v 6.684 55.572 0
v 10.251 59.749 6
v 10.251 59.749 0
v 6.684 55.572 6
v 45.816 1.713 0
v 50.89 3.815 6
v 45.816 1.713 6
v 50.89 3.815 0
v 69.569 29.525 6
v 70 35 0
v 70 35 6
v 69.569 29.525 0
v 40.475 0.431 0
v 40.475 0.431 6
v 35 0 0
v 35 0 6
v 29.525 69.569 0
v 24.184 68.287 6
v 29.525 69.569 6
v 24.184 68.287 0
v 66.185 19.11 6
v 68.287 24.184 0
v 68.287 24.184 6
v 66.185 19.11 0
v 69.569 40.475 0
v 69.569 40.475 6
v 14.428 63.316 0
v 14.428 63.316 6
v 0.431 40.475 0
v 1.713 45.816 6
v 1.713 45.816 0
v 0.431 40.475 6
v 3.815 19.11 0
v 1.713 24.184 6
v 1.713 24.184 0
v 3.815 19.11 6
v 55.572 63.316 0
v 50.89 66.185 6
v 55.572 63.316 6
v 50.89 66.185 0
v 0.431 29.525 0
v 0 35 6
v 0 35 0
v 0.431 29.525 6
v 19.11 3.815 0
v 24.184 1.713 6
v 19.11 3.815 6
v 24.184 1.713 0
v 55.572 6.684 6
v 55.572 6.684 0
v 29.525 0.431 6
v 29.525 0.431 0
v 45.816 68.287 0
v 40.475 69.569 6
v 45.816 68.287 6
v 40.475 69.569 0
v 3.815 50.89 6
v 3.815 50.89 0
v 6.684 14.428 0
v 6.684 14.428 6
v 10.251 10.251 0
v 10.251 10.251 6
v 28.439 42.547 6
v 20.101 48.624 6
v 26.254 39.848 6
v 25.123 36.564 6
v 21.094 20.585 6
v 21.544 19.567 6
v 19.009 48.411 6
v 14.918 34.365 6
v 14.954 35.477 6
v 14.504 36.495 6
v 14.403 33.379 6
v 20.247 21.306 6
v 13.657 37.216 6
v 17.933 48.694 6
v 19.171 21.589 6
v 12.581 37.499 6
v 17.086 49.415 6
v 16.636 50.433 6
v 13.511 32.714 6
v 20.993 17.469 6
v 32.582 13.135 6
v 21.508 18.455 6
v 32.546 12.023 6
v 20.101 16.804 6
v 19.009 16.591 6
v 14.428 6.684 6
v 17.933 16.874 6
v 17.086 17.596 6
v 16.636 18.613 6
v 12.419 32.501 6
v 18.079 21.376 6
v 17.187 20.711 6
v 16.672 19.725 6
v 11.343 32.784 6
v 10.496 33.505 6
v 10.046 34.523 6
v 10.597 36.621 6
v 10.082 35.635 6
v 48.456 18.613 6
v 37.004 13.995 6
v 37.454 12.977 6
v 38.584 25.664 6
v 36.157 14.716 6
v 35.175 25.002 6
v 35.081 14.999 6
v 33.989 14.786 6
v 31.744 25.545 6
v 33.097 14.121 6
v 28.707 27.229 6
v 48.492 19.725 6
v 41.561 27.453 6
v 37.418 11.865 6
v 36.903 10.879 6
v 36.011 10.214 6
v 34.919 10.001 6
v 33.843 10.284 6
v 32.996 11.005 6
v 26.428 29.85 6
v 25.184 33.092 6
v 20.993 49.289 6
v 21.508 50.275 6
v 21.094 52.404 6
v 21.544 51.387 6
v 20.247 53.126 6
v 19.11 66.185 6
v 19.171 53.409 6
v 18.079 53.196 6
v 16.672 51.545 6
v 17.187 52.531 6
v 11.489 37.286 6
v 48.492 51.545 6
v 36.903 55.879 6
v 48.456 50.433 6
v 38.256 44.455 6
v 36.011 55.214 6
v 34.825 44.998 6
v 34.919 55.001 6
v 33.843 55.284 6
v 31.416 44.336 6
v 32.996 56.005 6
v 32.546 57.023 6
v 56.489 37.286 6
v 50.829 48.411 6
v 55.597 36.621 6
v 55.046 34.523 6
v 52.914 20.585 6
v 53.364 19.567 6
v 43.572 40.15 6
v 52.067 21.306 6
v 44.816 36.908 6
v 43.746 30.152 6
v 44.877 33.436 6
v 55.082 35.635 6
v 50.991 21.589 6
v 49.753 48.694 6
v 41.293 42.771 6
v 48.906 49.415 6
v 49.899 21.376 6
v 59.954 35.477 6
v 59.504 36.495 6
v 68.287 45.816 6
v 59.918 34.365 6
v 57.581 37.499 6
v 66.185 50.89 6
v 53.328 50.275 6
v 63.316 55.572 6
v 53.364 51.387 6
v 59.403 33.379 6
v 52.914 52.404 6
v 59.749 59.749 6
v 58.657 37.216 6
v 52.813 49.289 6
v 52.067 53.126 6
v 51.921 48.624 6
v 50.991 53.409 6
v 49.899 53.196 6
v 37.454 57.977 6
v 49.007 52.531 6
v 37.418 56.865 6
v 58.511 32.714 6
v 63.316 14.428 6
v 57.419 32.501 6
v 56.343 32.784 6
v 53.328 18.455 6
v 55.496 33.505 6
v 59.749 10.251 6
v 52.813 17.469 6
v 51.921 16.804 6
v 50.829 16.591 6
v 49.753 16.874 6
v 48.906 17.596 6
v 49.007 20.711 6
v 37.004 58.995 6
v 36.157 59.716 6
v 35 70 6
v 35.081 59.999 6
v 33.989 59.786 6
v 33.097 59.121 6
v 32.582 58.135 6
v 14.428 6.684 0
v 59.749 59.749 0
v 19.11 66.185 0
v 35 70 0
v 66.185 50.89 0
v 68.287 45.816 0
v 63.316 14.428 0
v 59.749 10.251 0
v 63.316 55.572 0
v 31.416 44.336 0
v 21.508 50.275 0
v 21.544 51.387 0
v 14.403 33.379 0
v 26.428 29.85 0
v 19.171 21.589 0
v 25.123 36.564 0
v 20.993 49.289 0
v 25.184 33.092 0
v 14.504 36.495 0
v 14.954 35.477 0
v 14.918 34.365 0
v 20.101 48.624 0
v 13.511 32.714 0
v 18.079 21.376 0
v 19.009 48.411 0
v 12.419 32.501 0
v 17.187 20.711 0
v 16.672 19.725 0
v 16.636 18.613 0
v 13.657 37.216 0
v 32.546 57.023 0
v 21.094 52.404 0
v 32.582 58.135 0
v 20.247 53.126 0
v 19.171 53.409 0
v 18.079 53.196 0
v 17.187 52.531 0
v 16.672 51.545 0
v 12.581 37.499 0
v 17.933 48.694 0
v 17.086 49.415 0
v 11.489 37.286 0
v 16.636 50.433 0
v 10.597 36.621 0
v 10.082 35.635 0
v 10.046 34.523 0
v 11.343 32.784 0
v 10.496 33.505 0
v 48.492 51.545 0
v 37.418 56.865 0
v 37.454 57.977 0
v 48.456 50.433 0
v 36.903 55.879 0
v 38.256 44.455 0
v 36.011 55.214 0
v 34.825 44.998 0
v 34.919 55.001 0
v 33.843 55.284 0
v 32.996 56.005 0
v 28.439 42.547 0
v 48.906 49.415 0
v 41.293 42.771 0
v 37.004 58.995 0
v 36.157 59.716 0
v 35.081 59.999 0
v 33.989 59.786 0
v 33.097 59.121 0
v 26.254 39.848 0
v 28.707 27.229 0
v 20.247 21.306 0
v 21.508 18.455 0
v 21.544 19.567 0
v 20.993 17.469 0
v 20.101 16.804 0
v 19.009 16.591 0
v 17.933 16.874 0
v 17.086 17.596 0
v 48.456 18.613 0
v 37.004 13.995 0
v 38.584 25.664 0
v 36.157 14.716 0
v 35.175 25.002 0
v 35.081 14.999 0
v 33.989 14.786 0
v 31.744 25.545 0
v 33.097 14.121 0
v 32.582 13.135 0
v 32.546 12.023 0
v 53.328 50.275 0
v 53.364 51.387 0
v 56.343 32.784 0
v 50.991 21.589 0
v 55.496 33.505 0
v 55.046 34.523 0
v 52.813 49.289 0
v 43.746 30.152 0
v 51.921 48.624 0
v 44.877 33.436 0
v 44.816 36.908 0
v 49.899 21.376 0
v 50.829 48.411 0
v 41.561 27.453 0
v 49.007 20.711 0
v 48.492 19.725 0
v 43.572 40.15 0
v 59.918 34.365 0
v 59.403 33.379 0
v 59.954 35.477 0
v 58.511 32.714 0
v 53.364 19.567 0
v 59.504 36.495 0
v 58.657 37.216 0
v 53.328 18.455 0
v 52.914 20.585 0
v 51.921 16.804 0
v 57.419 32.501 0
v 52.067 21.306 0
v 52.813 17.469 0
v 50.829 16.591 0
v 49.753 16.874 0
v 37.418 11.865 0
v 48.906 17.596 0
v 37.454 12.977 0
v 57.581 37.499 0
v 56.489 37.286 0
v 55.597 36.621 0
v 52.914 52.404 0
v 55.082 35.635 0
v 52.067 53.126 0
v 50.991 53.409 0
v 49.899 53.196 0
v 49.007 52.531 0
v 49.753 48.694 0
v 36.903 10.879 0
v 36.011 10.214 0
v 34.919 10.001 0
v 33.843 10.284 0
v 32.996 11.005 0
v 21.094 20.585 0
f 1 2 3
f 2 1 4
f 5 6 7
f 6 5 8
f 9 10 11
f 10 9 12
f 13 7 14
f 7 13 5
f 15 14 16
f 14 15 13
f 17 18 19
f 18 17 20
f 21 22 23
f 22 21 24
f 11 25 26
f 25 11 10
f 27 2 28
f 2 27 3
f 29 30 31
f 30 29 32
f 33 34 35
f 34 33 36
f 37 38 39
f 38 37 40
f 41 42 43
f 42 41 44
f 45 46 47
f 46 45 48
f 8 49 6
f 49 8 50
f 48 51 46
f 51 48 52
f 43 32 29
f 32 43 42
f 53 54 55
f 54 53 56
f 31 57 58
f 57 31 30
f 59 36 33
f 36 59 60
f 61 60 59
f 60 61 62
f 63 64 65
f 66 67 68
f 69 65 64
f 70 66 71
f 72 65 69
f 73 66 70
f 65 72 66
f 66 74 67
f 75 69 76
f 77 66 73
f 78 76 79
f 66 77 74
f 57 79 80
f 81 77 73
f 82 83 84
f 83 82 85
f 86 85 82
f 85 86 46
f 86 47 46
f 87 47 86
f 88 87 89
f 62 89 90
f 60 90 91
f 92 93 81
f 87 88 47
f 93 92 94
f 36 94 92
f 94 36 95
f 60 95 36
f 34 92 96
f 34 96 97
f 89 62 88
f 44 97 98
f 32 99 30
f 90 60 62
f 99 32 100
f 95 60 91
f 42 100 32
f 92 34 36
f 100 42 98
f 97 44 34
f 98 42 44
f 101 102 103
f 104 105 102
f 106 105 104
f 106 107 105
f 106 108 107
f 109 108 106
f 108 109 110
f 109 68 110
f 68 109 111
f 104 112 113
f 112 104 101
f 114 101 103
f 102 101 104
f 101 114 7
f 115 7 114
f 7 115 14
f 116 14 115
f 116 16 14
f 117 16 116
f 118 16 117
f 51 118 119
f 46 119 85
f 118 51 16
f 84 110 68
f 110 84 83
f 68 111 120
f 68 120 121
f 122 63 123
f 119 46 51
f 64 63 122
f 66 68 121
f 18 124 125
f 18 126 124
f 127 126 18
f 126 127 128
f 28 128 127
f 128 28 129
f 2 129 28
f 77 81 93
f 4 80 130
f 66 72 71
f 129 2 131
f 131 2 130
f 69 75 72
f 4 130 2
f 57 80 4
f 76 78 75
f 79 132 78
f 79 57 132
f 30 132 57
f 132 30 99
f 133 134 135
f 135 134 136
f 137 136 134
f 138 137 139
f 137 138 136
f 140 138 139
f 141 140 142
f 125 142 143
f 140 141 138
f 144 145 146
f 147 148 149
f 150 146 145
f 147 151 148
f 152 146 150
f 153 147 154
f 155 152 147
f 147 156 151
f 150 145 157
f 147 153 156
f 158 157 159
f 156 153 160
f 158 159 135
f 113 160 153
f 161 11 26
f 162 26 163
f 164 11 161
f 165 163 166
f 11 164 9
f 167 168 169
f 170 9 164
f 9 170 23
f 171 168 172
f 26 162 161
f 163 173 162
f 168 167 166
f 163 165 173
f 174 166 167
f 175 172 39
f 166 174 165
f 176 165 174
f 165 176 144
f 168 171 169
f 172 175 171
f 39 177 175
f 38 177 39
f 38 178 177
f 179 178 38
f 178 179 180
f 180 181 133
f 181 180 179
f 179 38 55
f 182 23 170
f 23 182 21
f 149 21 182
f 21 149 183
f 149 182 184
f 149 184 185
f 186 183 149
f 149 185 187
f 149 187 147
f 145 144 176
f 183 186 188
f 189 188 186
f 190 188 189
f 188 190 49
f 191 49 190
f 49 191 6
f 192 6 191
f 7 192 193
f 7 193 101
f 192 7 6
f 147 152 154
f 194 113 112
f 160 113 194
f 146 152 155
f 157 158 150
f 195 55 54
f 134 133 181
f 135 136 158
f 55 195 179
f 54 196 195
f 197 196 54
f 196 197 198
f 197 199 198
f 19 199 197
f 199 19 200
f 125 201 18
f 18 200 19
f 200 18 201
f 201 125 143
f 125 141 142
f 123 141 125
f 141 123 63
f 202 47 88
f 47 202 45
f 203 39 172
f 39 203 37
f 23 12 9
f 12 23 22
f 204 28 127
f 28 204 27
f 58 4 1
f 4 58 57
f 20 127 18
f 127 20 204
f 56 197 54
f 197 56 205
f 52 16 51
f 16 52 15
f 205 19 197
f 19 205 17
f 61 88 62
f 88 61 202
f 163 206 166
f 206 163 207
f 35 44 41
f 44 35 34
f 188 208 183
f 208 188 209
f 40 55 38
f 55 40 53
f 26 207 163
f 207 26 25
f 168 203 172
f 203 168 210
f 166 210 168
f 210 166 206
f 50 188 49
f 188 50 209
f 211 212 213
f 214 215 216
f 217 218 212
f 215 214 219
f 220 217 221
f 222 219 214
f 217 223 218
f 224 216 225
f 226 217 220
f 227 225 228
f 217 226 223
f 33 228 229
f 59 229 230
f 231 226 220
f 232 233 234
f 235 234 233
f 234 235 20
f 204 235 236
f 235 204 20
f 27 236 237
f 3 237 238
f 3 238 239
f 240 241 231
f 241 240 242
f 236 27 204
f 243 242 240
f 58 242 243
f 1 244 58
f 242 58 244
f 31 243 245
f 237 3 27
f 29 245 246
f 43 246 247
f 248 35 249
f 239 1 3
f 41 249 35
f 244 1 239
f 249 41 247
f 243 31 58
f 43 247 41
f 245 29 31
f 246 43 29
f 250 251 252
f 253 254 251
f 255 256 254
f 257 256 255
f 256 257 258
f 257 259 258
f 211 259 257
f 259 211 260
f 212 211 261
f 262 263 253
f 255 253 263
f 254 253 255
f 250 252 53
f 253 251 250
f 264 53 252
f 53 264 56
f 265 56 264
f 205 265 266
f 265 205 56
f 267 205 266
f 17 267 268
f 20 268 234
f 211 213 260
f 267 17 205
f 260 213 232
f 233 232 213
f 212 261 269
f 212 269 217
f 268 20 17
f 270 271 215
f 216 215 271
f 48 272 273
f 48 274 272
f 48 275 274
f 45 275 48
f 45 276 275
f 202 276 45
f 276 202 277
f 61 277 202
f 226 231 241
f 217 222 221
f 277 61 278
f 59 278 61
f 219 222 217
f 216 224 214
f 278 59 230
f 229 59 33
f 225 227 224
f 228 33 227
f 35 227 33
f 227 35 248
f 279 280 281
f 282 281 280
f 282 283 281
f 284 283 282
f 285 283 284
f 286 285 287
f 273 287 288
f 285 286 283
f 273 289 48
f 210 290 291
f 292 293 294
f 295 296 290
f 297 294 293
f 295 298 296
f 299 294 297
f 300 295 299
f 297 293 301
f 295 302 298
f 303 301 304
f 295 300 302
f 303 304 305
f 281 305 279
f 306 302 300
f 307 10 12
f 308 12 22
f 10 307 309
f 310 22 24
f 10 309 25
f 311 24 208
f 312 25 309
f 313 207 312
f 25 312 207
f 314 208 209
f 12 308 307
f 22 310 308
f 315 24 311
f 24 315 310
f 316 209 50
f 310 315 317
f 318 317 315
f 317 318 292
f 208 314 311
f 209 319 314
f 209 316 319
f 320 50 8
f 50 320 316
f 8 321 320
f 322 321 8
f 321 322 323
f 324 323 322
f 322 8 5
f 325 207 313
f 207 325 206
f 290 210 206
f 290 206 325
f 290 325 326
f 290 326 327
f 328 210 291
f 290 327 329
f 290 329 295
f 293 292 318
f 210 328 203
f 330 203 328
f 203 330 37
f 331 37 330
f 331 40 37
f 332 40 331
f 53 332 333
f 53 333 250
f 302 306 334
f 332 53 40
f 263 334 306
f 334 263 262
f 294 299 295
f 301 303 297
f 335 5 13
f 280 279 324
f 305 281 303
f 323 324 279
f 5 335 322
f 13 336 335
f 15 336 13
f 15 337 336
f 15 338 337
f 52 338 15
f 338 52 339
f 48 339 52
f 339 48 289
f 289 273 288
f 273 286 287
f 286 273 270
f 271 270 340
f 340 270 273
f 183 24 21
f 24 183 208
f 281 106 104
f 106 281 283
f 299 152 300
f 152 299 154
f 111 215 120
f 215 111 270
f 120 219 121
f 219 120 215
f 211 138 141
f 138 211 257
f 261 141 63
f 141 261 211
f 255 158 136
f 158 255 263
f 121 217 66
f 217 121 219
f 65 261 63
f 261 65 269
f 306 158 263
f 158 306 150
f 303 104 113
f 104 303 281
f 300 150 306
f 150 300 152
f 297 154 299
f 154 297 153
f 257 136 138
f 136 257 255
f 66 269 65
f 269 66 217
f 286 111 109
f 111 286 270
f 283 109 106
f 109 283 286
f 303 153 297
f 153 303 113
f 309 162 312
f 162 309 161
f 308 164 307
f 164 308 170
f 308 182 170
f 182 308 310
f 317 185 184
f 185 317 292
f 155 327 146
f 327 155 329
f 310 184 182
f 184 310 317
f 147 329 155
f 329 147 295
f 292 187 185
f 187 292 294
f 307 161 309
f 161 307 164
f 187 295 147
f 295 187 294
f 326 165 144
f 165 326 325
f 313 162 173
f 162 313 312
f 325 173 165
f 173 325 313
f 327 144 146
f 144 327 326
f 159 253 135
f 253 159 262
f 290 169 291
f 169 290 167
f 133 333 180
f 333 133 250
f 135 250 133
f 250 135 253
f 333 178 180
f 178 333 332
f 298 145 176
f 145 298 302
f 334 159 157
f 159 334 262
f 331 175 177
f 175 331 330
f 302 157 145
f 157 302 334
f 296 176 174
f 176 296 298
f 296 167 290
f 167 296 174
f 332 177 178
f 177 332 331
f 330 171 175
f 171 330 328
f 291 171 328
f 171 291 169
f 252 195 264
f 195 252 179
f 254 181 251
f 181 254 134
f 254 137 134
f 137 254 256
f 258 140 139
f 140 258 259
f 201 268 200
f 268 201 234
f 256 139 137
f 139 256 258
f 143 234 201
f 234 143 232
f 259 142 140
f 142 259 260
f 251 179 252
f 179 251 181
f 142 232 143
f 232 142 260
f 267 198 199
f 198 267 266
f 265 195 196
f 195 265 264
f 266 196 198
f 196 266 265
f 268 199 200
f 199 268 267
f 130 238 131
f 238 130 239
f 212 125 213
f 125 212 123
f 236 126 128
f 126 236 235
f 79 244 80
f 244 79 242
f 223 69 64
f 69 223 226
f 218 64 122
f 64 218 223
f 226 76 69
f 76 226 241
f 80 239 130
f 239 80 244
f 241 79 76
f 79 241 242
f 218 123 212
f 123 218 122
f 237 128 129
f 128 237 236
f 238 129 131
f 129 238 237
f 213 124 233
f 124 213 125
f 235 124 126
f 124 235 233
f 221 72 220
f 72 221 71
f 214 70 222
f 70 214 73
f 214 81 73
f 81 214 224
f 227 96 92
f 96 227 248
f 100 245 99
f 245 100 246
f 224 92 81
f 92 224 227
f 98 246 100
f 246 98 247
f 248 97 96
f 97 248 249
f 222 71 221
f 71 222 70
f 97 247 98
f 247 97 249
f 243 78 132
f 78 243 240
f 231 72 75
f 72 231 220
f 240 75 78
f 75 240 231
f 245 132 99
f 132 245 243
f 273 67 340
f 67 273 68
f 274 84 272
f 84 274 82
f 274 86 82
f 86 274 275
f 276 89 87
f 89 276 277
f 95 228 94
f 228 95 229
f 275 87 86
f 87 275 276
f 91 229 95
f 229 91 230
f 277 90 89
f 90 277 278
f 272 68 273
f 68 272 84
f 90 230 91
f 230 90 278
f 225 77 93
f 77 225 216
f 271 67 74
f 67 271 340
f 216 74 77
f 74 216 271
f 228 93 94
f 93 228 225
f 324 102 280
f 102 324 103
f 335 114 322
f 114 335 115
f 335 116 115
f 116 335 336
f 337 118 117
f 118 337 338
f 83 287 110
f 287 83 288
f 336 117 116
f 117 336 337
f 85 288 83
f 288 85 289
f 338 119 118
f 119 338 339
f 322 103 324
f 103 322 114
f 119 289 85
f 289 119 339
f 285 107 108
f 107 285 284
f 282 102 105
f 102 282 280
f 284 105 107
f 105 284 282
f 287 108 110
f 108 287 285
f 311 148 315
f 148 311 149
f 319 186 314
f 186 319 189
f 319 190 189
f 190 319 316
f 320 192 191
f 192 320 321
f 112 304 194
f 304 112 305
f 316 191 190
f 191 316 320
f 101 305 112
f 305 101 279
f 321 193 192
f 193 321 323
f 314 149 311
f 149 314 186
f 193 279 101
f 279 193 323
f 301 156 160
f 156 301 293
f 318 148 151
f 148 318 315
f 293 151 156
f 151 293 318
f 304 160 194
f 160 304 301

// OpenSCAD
$fn = 32;

// ----------------------------------------------------------------------
// Spacer plate: round flange R35, 8 bolts
// ----------------------------------------------------------------------

// --- parameters (mm) ---
bore_r = 10;              // centre bore radius
bolt_r = 2.5;             // bolt hole radius
plate_t = 6;              // plate thickness, Z (extrusion height)
flange_r = 35;            // flange radius
n_bolt = 8;               // bolt hole count
ring_r = 22.5;            // bolt circle radius

profile = [[70, 35], [69.569, 40.475], [68.287, 45.816], [66.185, 50.89], [63.316, 55.572], [59.749, 59.749], [55.572, 63.316], [50.89, 66.185], [45.816, 68.287], [40.475, 69.569], [35, 70], [29.525, 69.569], [24.184, 68.287], [19.11, 66.185], [14.428, 63.316], [10.251, 59.749], [6.684, 55.572], [3.815, 50.89], [1.713, 45.816], [0.431, 40.475], [0, 35], [0.431, 29.525], [1.713, 24.184], [3.815, 19.11], [6.684, 14.428], [10.251, 10.251], [14.428, 6.684], [19.11, 3.815], [24.184, 1.713], [29.525, 0.431], [35, 0], [40.475, 0.431], [45.816, 1.713], [50.89, 3.815], [55.572, 6.684], [59.749, 10.251], [63.316, 14.428], [66.185, 19.11], [68.287, 24.184], [69.569, 29.525]];  // primary outline, 40 points, counter clockwise
void_1 = [[44.816, 36.908], [43.572, 40.15], [41.293, 42.771], [38.256, 44.455], [34.825, 44.998], [31.416, 44.336], [28.439, 42.547], [26.254, 39.848], [25.123, 36.564], [25.184, 33.092], [26.428, 29.85], [28.707, 27.229], [31.744, 25.545], [35.175, 25.002], [38.584, 25.664], [41.561, 27.453], [43.746, 30.152], [44.877, 33.436]];  // centre bore, 18 points
void_2 = [[59.954, 35.477], [59.504, 36.495], [58.657, 37.216], [57.581, 37.499], [56.489, 37.286], [55.597, 36.621], [55.082, 35.635], [55.046, 34.523], [55.496, 33.505], [56.343, 32.784], [57.419, 32.501], [58.511, 32.714], [59.403, 33.379], [59.918, 34.365]];  // bolt hole 1, 14 points
void_3 = [[53.364, 51.387], [52.914, 52.404], [52.067, 53.126], [50.991, 53.409], [49.899, 53.196], [49.007, 52.531], [48.492, 51.545], [48.456, 50.433], [48.906, 49.415], [49.753, 48.694], [50.829, 48.411], [51.921, 48.624], [52.813, 49.289], [53.328, 50.275]];  // bolt hole 2, 14 points
void_4 = [[37.454, 57.977], [37.004, 58.995], [36.157, 59.716], [35.081, 59.999], [33.989, 59.786], [33.097, 59.121], [32.582, 58.135], [32.546, 57.023], [32.996, 56.005], [33.843, 55.284], [34.919, 55.001], [36.011, 55.214], [36.903, 55.879], [37.418, 56.865]];  // bolt hole 3, 14 points
void_5 = [[21.544, 51.387], [21.094, 52.404], [20.247, 53.126], [19.171, 53.409], [18.079, 53.196], [17.187, 52.531], [16.672, 51.545], [16.636, 50.433], [17.086, 49.415], [17.933, 48.694], [19.009, 48.411], [20.101, 48.624], [20.993, 49.289], [21.508, 50.275]];  // bolt hole 4, 14 points
void_6 = [[14.954, 35.477], [14.504, 36.495], [13.657, 37.216], [12.581, 37.499], [11.489, 37.286], [10.597, 36.621], [10.082, 35.635], [10.046, 34.523], [10.496, 33.505], [11.343, 32.784], [12.419, 32.501], [13.511, 32.714], [14.403, 33.379], [14.918, 34.365]];  // bolt hole 5, 14 points
void_7 = [[21.544, 19.567], [21.094, 20.585], [20.247, 21.306], [19.171, 21.589], [18.079, 21.376], [17.187, 20.711], [16.672, 19.725], [16.636, 18.613], [17.086, 17.596], [17.933, 16.874], [19.009, 16.591], [20.101, 16.804], [20.993, 17.469], [21.508, 18.455]];  // bolt hole 6, 14 points
void_8 = [[37.454, 12.977], [37.004, 13.995], [36.157, 14.716], [35.081, 14.999], [33.989, 14.786], [33.097, 14.121], [32.582, 13.135], [32.546, 12.023], [32.996, 11.005], [33.843, 10.284], [34.919, 10.001], [36.011, 10.214], [36.903, 10.879], [37.418, 11.865]];  // bolt hole 7, 14 points
void_9 = [[53.364, 19.567], [52.914, 20.585], [52.067, 21.306], [50.991, 21.589], [49.899, 21.376], [49.007, 20.711], [48.492, 19.725], [48.456, 18.613], [48.906, 17.596], [49.753, 16.874], [50.829, 16.591], [51.921, 16.804], [52.813, 17.469], [53.328, 18.455]];  // bolt hole 8, 14 points

// --- the one profile operation ---
difference() {
  linear_extrude(height = plate_t) polygon(points = profile);
  translate([0, 0, -1])
    linear_extrude(height = plate_t + 2) polygon(points = void_1);
  translate([0, 0, -1])
    linear_extrude(height = plate_t + 2) polygon(points = void_2);
  translate([0, 0, -1])
    linear_extrude(height = plate_t + 2) polygon(points = void_3);
  translate([0, 0, -1])
    linear_extrude(height = plate_t + 2) polygon(points = void_4);
  translate([0, 0, -1])
    linear_extrude(height = plate_t + 2) polygon(points = void_5);
  translate([0, 0, -1])
    linear_extrude(height = plate_t + 2) polygon(points = void_6);
  translate([0, 0, -1])
    linear_extrude(height = plate_t + 2) polygon(points = void_7);
  translate([0, 0, -1])
    linear_extrude(height = plate_t + 2) polygon(points = void_8);
  translate([0, 0, -1])
    linear_extrude(height = plate_t + 2) polygon(points = void_9);
}
